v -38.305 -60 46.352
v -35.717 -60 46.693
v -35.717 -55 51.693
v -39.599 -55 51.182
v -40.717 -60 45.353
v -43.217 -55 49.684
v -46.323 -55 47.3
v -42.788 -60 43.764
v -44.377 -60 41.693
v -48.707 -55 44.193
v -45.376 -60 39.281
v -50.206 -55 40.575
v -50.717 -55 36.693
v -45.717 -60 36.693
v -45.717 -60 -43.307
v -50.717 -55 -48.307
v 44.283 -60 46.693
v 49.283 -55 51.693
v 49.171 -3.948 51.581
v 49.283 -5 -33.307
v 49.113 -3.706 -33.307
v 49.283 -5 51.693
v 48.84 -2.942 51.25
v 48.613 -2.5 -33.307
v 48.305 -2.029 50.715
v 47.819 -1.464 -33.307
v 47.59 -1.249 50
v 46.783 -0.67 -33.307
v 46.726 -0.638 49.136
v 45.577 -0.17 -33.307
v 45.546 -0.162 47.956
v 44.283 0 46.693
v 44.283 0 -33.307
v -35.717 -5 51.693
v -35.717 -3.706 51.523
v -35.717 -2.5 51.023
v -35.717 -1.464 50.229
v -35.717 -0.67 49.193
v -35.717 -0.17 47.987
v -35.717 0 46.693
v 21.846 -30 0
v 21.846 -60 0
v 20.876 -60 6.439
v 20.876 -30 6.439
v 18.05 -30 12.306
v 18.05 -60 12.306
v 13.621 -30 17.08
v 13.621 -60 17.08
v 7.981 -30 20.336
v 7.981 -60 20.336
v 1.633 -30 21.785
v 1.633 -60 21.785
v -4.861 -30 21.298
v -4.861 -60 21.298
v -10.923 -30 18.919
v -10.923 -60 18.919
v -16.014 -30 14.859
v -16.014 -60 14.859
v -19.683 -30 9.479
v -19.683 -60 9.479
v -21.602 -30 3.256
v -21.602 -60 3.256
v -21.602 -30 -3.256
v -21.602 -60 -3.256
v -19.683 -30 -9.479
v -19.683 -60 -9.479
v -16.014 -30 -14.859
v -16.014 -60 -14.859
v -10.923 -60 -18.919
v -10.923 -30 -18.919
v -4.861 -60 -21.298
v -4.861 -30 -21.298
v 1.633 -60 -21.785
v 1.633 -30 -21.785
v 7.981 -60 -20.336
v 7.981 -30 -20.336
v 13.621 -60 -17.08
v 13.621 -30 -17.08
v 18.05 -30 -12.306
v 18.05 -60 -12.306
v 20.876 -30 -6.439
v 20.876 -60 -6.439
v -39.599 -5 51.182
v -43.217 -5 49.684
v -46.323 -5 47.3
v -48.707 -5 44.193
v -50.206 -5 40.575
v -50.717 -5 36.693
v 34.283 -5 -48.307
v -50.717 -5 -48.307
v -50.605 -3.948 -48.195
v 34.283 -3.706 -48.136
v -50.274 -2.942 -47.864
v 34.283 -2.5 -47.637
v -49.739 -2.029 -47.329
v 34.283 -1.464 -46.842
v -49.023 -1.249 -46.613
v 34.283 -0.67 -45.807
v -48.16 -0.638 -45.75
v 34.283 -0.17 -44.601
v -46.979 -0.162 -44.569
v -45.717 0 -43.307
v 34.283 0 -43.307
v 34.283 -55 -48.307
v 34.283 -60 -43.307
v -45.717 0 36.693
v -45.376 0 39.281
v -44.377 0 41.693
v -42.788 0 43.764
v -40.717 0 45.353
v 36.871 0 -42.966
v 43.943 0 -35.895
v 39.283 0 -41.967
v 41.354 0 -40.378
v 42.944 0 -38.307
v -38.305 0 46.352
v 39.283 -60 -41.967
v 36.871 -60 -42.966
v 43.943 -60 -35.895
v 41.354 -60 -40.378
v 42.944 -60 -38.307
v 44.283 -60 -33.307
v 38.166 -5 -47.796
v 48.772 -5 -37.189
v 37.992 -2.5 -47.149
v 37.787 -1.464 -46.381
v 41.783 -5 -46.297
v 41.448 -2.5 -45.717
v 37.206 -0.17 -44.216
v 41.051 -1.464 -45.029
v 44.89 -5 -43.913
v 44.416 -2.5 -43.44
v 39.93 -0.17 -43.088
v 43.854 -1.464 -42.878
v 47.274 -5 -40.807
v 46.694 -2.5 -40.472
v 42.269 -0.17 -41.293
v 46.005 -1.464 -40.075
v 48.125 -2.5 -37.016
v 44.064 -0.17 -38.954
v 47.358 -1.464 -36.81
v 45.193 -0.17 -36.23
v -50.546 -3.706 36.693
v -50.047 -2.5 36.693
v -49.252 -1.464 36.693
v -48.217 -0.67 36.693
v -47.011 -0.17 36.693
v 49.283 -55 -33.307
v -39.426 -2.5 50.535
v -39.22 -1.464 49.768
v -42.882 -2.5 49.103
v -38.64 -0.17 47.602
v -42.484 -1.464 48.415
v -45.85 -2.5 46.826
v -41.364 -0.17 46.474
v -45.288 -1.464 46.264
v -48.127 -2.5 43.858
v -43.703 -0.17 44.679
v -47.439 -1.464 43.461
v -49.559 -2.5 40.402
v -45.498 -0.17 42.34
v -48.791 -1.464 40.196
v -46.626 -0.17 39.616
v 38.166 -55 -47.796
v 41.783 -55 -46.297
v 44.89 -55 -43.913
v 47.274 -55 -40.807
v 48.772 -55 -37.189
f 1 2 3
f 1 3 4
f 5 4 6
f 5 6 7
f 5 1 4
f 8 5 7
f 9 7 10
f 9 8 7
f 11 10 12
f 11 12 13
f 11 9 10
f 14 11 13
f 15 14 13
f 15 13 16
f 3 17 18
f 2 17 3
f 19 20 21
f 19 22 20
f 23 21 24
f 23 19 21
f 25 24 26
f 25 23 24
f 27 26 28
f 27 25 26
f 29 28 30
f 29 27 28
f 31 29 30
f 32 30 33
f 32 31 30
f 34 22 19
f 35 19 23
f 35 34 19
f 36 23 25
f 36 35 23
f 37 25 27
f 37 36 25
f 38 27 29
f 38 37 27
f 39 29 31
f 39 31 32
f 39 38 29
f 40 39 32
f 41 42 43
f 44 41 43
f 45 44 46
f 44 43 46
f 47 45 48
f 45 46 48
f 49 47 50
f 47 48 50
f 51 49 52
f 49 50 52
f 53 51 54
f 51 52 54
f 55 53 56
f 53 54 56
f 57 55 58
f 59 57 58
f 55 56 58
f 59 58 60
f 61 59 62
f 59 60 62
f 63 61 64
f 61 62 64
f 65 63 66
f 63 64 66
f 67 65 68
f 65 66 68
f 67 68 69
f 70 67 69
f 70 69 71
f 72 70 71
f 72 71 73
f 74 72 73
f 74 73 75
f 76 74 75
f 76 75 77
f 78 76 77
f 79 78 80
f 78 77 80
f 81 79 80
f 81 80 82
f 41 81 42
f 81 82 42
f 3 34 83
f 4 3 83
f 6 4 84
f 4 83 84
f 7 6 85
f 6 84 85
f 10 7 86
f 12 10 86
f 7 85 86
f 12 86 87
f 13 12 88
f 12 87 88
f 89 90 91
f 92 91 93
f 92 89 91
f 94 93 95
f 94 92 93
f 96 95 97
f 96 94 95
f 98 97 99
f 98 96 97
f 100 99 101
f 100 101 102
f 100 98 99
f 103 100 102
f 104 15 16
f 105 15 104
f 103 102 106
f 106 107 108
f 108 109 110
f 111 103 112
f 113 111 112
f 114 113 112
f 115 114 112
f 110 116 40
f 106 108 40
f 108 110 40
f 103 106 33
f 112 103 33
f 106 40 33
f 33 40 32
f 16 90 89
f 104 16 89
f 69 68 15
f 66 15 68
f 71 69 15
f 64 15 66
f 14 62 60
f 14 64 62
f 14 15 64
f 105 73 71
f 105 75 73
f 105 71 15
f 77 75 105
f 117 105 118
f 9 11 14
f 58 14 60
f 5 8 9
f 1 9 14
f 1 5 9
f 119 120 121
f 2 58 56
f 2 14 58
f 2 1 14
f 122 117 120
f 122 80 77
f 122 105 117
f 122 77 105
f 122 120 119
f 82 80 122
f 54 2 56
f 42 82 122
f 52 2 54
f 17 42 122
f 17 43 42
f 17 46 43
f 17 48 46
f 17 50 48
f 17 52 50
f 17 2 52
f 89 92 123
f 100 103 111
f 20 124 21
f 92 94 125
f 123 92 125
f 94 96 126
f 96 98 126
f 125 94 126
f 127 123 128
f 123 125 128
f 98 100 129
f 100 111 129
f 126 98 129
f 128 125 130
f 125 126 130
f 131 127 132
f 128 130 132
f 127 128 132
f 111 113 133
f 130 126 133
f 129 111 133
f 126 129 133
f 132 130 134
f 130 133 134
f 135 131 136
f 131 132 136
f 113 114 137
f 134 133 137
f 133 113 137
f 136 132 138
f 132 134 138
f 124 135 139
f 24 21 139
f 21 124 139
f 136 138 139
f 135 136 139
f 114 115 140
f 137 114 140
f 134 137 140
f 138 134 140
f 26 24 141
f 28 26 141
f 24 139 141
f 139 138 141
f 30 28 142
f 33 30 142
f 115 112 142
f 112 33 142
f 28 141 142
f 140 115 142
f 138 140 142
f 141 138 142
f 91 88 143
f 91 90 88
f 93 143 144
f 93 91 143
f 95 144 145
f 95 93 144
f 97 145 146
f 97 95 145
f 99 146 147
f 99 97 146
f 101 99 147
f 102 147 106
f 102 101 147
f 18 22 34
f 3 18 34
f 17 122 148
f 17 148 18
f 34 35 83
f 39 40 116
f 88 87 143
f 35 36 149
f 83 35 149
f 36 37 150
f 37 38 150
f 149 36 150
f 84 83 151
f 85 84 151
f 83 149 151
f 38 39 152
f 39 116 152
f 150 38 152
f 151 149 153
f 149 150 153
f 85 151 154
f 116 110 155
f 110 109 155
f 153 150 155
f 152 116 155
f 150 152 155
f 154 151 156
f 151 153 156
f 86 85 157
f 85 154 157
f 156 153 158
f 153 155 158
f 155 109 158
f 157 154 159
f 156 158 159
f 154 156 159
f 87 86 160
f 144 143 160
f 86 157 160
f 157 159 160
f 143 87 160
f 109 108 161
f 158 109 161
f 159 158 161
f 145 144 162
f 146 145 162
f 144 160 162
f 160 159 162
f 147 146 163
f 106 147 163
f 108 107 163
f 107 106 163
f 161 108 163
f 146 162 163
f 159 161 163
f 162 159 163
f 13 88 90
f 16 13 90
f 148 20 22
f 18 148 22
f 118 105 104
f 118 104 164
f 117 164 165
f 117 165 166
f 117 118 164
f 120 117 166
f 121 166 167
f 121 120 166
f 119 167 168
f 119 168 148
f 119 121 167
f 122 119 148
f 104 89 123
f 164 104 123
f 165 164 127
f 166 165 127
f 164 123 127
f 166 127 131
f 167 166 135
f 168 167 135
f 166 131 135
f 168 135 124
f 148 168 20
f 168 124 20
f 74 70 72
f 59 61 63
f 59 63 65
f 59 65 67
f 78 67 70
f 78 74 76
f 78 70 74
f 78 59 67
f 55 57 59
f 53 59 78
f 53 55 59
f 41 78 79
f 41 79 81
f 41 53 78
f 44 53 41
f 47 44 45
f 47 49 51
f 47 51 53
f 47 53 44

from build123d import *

# Parameters (mm, degrees)
F1_DEPTH = 60
F2_R     = 5
F3_SIZE  = 5
F5_R     = 21.846127
F6_DEPTH = 30


with BuildPart() as f1:
    # F0 (on Front) → F1 (new body)
    with BuildSketch(Plane.XZ):
        with BuildLine():
            Line((49.28327, 51.693205), (-35.71673, 51.693205))
            ThreePointArc((-35.71673, 51.693205), (-46.323332, 47.299807), (-50.71673, 36.693205))
            Line((-50.71673, 36.693205), (-50.71673, -48.306795))
            Line((-50.71673, -48.306795), (34.28327, -48.306795))
            ThreePointArc((34.28327, -48.306795), (44.889872, -43.913397), (49.28327, -33.306795))
            Line((49.28327, -33.306795), (49.28327, 51.693205))
        make_face()
    extrude(amount=F1_DEPTH)

    # F2
    f2_edges = [f1.edges().sort_by_distance(p)[0] for p in [
        (49.28327, 0, 9.193205),
        (6.78327, 0, 51.693205),
        (-46.323332, 0, 47.299807),
        (-50.71673, 0, -5.806795),
        (-8.21673, 0, -48.306795),
        (44.889872, 0, -43.913397),
    ]]
    fillet(f2_edges, radius=F2_R)

    # F3
    f3_edges = [f1.edges().sort_by_distance(p)[0] for p in [
        (49.28327, -60, 9.193205),
        (6.78327, -60, 51.693205),
        (-46.323332, -60, 47.299807),
        (-50.71673, -60, -5.806795),
        (-8.21673, -60, -48.306795),
        (44.889872, -60, -43.913397),
    ]]
    chamfer(f3_edges, length=F3_SIZE)

    # F5 (on face) → F6 (cut)
    with BuildSketch(Plane.XZ.offset(60)):
        Circle(F5_R)
    extrude(amount=-F6_DEPTH, mode=Mode.SUBTRACT)


solid = f1.part
